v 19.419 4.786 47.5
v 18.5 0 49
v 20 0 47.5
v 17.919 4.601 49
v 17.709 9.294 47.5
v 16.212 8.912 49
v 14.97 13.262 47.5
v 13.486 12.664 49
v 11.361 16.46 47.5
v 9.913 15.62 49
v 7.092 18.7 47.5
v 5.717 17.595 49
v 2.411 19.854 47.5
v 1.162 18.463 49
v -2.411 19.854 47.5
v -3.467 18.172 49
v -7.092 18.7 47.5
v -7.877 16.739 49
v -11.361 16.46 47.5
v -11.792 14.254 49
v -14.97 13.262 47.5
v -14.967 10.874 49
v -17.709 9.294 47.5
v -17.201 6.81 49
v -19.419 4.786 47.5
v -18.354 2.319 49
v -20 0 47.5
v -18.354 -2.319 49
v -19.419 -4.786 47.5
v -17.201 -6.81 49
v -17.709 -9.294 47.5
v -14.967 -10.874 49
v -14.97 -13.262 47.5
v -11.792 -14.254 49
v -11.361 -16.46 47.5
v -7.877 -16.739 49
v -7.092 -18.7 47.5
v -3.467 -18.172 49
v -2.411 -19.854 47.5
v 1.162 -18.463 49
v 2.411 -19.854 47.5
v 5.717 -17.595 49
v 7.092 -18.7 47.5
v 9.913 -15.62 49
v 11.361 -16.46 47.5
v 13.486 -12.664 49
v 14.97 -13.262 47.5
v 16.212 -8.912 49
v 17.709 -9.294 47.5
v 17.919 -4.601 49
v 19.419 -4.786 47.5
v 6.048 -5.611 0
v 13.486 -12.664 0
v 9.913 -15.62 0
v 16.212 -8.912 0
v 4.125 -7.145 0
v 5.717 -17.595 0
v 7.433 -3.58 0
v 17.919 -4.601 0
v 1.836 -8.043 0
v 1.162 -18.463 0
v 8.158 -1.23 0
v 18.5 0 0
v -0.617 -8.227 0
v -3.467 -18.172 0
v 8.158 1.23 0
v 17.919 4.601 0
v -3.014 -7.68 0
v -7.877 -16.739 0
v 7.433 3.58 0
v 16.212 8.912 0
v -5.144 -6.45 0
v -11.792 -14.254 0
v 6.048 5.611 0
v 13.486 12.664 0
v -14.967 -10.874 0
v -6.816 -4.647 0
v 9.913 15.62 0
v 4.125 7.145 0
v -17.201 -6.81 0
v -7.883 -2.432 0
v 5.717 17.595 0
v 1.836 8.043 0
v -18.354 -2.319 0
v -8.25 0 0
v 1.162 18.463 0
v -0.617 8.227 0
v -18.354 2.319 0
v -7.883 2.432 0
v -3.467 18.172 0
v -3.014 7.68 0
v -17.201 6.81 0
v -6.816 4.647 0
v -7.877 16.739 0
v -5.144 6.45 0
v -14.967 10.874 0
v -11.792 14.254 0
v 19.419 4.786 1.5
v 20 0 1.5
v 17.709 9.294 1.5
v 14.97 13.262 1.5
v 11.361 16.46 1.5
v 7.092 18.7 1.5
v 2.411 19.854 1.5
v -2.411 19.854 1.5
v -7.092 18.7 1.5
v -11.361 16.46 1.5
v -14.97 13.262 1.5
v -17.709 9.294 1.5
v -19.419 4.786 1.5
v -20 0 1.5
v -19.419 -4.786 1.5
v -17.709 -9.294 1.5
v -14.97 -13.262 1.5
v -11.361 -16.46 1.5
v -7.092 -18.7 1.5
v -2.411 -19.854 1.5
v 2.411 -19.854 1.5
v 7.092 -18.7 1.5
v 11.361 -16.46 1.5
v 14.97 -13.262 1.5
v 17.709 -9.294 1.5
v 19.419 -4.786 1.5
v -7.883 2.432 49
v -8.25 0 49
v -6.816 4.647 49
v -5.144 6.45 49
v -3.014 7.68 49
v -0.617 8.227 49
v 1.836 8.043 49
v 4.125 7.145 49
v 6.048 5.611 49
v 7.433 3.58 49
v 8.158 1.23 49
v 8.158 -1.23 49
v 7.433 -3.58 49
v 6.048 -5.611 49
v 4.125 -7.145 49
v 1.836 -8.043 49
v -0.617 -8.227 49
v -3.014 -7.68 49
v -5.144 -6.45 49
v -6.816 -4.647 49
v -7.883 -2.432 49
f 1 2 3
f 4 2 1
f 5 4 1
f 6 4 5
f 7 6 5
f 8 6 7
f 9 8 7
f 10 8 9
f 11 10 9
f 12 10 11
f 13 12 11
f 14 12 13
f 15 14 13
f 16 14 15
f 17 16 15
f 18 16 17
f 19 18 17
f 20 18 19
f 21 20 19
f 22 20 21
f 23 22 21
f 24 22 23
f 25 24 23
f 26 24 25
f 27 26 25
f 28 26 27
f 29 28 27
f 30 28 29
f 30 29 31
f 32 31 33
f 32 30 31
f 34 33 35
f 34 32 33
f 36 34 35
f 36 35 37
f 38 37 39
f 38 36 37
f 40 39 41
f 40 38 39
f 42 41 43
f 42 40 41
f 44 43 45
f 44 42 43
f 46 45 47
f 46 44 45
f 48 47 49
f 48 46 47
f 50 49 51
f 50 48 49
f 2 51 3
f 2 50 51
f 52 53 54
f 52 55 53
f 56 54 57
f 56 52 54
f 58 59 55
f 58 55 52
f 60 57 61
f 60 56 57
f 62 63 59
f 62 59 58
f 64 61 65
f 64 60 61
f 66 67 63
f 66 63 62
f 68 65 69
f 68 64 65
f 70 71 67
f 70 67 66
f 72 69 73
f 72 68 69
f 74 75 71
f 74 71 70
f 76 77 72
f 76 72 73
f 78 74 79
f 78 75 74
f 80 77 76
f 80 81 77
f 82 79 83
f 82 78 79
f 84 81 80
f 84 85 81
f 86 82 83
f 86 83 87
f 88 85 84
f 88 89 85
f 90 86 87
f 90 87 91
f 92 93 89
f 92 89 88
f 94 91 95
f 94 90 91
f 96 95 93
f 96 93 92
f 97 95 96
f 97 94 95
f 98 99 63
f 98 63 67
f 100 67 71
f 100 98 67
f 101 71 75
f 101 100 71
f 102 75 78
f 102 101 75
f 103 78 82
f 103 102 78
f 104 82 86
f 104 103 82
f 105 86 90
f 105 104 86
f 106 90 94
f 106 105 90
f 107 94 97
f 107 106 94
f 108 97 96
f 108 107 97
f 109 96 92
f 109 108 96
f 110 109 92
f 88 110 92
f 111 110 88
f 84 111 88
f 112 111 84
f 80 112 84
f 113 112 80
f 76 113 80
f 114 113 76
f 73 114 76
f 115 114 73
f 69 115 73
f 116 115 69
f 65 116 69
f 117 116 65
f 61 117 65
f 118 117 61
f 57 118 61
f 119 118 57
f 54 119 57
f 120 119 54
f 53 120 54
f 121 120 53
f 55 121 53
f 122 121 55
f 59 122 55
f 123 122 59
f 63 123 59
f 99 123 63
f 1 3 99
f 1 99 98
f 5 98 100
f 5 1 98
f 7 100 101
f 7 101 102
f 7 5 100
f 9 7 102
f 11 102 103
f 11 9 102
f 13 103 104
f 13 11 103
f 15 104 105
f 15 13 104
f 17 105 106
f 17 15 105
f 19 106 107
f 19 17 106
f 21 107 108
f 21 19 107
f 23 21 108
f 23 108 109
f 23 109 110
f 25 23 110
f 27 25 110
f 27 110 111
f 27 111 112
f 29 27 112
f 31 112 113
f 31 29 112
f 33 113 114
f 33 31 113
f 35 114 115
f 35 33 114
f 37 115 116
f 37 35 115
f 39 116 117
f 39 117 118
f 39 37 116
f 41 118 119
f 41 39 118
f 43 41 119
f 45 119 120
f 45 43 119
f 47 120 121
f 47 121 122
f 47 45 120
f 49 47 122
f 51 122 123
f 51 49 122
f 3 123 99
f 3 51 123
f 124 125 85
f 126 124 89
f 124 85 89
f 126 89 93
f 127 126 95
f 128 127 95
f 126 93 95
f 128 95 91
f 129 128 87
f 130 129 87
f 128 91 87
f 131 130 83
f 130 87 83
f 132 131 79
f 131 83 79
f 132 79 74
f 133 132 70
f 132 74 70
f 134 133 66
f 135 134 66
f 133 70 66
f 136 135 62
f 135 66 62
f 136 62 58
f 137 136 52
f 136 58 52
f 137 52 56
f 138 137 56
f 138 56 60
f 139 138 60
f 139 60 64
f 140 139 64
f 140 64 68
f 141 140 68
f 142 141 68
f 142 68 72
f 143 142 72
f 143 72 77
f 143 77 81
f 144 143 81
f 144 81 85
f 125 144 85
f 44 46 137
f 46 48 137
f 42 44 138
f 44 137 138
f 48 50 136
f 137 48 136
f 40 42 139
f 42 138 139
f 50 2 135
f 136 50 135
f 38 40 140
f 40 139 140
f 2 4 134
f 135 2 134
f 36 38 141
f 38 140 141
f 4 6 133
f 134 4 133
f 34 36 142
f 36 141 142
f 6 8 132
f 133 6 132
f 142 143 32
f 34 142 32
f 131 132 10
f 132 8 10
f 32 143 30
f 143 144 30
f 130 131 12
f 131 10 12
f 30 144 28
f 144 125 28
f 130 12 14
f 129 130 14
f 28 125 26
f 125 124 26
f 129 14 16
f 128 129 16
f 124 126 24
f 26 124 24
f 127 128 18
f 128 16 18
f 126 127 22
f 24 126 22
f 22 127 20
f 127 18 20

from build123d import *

# Parameters (mm, degrees)
F0_W    = 20
F0_H    = 49
F3_D    = 16.5
F4_SIZE = 1.5


with BuildPart() as f1:
    # F0 (on Front) → F1 (revolve)
    with BuildSketch(Plane.XZ):
        with Locations((10, 24.5)):
            Rectangle(F0_W, F0_H)
    revolve(axis=Axis((0, 0, 21.905942), (0, 0, 1)))

    # F3 (through all)
    with Locations(Plane.XY.offset(49)):
        with Locations((0, 0)):
            Hole(F3_D / 2)

    # F4
    f4_edges = [f1.edges().sort_by_distance(p)[0] for p in [
        (-20, 0, 49),
        (-20, 0, 0),
    ]]
    chamfer(f4_edges, length=F4_SIZE)


solid = f1.part
